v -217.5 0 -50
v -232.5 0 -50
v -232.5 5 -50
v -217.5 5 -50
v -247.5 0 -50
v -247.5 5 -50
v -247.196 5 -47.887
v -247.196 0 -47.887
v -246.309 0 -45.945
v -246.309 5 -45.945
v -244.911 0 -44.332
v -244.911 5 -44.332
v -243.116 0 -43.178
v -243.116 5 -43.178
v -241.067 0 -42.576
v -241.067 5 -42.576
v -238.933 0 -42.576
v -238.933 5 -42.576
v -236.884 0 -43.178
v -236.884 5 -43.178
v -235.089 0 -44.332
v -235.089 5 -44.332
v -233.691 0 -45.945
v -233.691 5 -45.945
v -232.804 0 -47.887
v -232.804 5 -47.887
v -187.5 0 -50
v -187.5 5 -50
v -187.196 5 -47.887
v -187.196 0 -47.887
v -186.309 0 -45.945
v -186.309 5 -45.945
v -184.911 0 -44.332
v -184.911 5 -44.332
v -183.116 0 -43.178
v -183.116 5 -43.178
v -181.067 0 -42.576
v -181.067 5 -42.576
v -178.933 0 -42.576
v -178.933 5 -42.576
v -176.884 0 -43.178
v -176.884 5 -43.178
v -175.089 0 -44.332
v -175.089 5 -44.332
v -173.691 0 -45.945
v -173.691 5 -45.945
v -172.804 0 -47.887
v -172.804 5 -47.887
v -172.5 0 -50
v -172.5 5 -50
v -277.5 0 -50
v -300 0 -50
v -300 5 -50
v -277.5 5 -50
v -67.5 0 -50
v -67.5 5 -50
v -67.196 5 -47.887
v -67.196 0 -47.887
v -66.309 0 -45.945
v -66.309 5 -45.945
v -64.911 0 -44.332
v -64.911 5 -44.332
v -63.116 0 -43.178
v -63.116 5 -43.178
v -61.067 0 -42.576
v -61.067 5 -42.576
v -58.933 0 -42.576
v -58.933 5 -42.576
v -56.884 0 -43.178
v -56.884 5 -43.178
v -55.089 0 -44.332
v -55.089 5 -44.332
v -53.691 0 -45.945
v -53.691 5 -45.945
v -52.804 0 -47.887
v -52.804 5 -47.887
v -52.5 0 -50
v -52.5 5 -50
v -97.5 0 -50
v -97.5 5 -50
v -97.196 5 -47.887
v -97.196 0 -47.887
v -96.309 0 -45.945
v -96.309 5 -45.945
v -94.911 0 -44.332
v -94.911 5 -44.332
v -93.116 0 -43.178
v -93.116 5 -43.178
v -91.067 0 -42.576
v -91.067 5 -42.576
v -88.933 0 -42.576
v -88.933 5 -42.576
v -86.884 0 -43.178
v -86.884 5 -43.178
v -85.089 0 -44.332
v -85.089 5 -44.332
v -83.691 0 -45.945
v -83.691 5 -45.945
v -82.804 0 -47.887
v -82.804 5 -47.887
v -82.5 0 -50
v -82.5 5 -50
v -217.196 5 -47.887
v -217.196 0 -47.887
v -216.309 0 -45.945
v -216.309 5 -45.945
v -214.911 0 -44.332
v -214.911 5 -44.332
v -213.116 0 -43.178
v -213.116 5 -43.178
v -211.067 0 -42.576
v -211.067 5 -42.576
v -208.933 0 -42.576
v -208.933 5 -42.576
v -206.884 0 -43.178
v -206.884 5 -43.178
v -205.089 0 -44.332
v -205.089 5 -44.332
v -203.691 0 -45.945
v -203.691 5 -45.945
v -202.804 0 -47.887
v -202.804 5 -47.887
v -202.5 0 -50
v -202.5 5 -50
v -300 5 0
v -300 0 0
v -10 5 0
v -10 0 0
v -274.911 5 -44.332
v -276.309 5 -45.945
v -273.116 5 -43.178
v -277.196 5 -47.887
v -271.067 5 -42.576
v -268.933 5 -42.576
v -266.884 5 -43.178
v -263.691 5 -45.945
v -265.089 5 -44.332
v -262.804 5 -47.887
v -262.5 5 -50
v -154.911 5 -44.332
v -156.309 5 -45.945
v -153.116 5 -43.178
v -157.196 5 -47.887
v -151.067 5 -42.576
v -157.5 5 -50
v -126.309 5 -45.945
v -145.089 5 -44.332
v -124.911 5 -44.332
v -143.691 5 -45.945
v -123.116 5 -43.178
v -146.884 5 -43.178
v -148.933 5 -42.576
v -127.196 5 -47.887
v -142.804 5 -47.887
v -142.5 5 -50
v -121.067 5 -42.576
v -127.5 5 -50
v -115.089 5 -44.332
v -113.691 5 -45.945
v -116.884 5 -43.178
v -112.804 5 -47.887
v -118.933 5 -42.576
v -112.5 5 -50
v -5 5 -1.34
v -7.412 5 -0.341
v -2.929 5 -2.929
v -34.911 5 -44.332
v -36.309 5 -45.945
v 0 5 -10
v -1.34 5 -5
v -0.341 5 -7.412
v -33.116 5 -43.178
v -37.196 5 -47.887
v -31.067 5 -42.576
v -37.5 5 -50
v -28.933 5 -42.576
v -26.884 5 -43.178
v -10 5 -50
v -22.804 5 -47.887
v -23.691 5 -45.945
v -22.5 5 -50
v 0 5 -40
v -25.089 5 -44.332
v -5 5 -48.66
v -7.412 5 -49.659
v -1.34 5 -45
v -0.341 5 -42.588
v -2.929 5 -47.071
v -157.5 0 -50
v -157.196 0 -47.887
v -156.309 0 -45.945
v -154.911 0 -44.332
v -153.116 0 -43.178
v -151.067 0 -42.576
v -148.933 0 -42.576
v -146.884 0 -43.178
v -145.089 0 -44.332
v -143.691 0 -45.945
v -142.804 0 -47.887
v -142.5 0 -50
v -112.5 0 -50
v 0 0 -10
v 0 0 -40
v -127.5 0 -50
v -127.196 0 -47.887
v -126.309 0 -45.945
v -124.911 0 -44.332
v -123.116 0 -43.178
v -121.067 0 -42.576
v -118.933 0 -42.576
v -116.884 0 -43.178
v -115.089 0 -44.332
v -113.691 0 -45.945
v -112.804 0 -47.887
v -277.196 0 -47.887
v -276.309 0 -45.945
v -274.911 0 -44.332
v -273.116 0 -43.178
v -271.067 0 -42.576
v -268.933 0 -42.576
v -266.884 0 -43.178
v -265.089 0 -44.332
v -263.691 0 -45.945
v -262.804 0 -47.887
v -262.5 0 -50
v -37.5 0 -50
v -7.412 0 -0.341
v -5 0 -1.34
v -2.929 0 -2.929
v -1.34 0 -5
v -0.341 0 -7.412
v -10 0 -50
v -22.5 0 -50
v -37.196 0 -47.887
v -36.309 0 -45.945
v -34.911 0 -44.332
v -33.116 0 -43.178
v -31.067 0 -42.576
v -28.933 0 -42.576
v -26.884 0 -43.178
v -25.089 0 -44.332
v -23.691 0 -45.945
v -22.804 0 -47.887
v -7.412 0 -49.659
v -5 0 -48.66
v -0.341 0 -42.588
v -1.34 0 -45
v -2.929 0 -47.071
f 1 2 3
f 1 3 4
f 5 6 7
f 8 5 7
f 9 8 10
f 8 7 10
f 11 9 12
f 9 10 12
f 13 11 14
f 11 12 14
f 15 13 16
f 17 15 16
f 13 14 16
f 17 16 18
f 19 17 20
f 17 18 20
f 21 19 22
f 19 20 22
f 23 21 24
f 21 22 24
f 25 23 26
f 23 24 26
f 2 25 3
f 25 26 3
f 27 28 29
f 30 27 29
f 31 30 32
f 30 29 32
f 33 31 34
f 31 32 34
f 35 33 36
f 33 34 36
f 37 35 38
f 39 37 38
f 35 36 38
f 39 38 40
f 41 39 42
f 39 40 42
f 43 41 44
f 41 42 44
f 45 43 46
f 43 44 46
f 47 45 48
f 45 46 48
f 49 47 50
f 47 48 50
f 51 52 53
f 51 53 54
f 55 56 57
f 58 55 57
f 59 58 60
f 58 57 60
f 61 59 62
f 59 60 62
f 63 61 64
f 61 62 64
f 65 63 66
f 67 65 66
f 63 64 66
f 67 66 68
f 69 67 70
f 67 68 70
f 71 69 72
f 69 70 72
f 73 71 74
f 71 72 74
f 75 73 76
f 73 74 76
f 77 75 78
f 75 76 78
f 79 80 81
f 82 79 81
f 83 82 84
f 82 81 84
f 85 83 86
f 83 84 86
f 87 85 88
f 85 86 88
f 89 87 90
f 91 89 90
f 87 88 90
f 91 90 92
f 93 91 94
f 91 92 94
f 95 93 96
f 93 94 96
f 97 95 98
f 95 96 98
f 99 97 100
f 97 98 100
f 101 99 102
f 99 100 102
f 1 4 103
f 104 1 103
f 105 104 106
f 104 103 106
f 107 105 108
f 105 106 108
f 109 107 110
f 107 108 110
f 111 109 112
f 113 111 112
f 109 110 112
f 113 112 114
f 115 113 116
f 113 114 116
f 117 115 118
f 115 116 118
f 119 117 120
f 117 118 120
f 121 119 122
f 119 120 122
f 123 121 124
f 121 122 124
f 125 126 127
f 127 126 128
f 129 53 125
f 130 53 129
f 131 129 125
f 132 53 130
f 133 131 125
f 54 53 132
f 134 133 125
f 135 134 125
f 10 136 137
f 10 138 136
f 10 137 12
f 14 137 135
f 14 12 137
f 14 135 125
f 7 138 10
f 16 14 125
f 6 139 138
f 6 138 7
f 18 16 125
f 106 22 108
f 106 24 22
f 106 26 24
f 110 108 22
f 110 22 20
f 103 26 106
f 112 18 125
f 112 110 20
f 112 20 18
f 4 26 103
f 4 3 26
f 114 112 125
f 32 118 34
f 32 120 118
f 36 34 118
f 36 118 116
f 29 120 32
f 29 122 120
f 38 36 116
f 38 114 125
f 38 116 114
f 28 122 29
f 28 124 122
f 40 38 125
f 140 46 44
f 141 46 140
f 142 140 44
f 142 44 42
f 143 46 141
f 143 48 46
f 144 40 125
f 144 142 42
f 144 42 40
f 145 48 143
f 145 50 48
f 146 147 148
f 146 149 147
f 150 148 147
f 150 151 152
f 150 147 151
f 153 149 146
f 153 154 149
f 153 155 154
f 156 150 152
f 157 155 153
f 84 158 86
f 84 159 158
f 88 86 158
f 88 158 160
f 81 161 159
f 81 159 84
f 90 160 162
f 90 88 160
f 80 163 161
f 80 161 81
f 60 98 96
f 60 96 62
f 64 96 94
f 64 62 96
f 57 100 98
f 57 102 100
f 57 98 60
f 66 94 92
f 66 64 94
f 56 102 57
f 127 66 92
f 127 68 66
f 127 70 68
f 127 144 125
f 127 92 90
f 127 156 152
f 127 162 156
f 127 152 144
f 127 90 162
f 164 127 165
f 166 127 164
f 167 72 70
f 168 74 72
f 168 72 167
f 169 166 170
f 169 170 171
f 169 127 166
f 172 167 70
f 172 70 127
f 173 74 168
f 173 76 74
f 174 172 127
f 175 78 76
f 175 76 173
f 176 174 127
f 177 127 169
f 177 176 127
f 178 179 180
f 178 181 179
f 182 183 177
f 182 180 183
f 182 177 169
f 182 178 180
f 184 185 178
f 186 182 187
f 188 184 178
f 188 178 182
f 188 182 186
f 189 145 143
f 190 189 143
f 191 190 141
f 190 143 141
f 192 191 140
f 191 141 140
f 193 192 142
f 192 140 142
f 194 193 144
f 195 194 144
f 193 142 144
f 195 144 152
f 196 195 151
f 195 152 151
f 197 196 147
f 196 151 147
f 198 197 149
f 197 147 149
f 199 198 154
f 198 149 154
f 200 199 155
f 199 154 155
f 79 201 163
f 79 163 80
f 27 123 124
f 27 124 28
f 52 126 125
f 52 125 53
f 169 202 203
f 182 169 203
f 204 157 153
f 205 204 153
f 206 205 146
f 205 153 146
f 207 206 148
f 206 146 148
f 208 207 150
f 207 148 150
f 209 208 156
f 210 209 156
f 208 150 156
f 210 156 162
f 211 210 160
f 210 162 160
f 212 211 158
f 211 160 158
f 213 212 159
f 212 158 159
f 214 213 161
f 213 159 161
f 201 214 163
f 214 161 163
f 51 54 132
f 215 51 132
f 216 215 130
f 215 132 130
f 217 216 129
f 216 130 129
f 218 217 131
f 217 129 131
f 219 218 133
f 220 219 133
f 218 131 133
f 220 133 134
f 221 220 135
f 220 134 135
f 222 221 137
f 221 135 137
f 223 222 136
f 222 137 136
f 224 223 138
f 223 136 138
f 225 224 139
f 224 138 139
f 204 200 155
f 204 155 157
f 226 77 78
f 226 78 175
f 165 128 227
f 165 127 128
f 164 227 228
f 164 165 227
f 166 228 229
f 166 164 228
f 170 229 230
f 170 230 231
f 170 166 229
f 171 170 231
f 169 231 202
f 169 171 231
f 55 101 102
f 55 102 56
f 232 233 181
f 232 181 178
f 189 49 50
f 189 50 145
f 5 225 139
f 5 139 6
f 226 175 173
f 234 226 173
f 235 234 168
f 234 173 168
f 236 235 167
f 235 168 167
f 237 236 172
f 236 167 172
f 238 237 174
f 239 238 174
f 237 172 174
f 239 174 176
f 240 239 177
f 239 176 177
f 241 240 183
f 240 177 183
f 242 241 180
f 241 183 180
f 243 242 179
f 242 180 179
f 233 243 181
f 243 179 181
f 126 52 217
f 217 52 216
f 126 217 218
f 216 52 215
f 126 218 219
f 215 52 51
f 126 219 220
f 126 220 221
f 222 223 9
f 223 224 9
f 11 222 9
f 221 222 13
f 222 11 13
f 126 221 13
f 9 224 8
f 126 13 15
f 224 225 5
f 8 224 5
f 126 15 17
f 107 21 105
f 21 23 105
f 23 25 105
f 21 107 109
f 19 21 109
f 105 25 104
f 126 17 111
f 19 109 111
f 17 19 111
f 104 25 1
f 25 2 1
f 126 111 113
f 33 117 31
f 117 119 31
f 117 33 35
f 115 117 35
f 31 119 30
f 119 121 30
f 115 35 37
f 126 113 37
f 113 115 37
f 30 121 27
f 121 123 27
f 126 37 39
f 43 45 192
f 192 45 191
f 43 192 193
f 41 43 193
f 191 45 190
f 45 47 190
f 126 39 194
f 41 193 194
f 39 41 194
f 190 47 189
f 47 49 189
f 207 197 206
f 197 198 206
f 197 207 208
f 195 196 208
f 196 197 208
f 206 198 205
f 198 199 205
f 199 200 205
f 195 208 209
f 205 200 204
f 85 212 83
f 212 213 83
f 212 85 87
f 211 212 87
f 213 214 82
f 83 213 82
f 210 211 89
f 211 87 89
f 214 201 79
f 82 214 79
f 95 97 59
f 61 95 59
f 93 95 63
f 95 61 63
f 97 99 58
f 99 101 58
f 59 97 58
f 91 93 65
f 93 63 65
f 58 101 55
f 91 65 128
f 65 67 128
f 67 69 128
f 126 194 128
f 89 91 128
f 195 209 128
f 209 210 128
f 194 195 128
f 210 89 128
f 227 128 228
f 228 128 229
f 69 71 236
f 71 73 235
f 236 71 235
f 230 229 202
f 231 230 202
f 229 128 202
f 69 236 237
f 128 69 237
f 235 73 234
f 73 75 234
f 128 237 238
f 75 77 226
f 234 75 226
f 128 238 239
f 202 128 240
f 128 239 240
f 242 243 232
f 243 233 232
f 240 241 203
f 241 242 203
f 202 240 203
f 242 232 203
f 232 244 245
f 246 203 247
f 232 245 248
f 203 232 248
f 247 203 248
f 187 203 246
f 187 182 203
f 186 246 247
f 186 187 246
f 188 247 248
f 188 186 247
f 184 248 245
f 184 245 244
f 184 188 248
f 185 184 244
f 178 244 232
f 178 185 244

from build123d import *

# Parameters (mm, degrees)
SKETCH1_W           = 300
SKETCH1_H           = 50
BOSS_EXTRUDE1_DEPTH = 5
SKETCH2_R           = 7.5
CUT_EXTRUDE1_DEPTH  = 5
LPATTERN1_COUNT     = 9
LPATTERN1_PITCH     = 30
FILLET2_R           = 10


with BuildPart() as part:
    # Sketch1 → Boss-Extrude1 (new body)
    with BuildSketch(Plane(origin=(0, 0, 0), x_dir=(1, 0, 0), z_dir=(0, 1, 0))):
        with Locations((-150, 25)):
            Rectangle(SKETCH1_W, SKETCH1_H)
    extrude(amount=BOSS_EXTRUDE1_DEPTH)

    # Sketch2 → Cut-Extrude1 (cut)
    with BuildSketch(Plane(origin=(0, 5, 0), x_dir=(1, 0, 0), z_dir=(0, 1, 0))):
        with Locations((-270, 50)):
            Circle(SKETCH2_R)
    cut_extrude1 = extrude(amount=-CUT_EXTRUDE1_DEPTH, mode=Mode.SUBTRACT)

    # LPattern1: Cut-Extrude1 ×9
    with Locations(*[(i * LPATTERN1_PITCH, 0, 0) for i in range(1, LPATTERN1_COUNT)]):
        add(cut_extrude1, mode=Mode.SUBTRACT)

    # Fillet2
    fillet2_edges = [part.edges().sort_by_distance(p)[0] for p in [
        (0, 2.5, 0),
        (0, 2.5, -50),
    ]]
    fillet(fillet2_edges, radius=FILLET2_R)


solid = part.part
